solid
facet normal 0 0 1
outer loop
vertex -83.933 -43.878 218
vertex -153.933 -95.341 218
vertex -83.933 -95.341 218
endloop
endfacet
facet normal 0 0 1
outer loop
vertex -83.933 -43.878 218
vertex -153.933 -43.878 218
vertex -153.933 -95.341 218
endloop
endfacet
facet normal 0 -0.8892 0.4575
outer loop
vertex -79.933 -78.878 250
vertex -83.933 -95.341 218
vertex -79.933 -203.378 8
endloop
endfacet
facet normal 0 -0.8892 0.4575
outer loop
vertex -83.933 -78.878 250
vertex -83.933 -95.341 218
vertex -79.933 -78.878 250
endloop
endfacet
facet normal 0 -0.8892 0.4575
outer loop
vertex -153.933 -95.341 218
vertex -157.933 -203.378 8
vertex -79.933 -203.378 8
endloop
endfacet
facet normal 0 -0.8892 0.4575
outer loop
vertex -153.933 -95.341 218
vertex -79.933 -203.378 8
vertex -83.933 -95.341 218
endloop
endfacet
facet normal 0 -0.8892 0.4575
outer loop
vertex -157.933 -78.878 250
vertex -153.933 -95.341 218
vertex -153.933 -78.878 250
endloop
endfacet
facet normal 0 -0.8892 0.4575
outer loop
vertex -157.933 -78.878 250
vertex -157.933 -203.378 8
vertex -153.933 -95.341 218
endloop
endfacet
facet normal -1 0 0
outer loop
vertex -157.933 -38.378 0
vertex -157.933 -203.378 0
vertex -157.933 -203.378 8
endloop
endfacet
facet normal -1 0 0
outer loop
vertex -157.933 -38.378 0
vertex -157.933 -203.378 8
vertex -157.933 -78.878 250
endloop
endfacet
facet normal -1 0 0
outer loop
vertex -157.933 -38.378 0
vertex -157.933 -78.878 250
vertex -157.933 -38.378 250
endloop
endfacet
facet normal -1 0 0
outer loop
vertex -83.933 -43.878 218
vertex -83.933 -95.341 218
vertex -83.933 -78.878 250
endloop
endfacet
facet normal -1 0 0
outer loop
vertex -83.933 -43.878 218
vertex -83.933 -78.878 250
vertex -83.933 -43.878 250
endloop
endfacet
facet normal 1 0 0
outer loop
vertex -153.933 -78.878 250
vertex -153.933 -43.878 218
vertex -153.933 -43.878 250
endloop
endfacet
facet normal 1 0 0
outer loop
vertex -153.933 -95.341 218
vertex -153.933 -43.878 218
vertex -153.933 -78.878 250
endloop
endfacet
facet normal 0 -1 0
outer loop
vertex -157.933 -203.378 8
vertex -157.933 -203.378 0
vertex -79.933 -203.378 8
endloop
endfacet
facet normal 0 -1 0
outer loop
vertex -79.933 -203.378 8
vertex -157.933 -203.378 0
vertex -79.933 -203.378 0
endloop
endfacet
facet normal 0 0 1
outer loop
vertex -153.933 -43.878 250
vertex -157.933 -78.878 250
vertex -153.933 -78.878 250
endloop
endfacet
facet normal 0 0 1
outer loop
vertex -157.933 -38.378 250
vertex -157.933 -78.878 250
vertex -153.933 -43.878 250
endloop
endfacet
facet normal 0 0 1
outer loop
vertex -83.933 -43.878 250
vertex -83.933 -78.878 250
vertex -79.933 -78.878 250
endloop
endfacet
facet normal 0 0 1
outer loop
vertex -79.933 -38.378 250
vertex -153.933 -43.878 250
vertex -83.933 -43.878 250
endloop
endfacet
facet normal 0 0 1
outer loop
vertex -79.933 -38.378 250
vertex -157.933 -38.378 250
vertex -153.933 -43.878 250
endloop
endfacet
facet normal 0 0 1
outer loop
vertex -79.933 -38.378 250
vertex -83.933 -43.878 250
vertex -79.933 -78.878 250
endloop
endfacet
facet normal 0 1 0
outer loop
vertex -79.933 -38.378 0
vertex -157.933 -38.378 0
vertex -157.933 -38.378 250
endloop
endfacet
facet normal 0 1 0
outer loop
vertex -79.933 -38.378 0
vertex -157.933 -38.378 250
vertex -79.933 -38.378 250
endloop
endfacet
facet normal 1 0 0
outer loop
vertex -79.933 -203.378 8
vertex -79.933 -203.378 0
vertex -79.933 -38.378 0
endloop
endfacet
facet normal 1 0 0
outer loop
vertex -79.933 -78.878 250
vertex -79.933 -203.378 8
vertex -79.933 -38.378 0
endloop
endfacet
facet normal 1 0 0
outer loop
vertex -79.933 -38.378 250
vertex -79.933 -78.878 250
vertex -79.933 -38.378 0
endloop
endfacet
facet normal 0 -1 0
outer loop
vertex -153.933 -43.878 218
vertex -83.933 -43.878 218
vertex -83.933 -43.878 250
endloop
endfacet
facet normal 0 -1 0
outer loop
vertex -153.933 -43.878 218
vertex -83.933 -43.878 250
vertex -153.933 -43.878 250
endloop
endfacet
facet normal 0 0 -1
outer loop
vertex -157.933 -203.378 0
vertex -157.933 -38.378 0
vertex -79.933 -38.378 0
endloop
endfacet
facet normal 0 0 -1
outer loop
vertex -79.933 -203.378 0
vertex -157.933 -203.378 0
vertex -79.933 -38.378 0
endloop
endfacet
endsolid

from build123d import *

# Parameters (mm, degrees)
ESQUISSE1_W                  = 78
ESQUISSE1_H                  = 165
BOSS_EXTRU_2_DEPTH           = 250
ENL_V_MAT_EXTRU_6_DEPTH      = 359.895122211
ENL_V_MAT_EXTRU_6_DEPTH_BACK = 32
ENL_V_MAT_EXTRU_7_DEPTH      = 332.582217321
ENL_V_MAT_EXTRU_7_DEPTH_BACK = 78


with BuildPart() as part:
    # Esquisse1 → Boss.-Extru.2 (new body)
    with BuildSketch(Plane.XY):
        with Locations((-118.933346394, -120.878383423)):
            Rectangle(ESQUISSE1_W, ESQUISSE1_H)
    extrude(amount=BOSS_EXTRU_2_DEPTH)

    # Esquisse3 → Enlèv. mat.-Extru.6 (cut, two sides: drawn at the far end of the back side and taken through both)
    with BuildSketch(Plane.XY.offset(250).offset(-ENL_V_MAT_EXTRU_6_DEPTH_BACK)):
        Polygon((-83.933346394, -575.046739794), (-83.933346394, -203.378383423), (-83.933346394, -43.878383423), (-153.933346394, -43.878383423), (-153.933346394, -203.378383423), (-153.933346394, -575.046739794), (-153.933346394, -1318.383452535), (-83.933346394, -1318.383452535), align=None)
    extrude(amount=ENL_V_MAT_EXTRU_6_DEPTH + ENL_V_MAT_EXTRU_6_DEPTH_BACK, mode=Mode.SUBTRACT)

    # Esquisse5 → Enlèv. mat.-Extru.7 (cut, two sides: drawn at the far end of the back side and taken through both)
    with BuildSketch(Plane(origin=(-79.933346394, 0, 0), x_dir=(0, 0, -1), z_dir=(1, 0, 0)).offset(-ENL_V_MAT_EXTRU_7_DEPTH_BACK)):
        Polygon((-779.795226733, 193.681557603), (-250, -78.878383423), (-8, -203.378383423), (521.795226733, -475.938324449), (-23.324655319, -1535.528777915), (-1324.915108785, -865.908895863), align=None)
    extrude(amount=ENL_V_MAT_EXTRU_7_DEPTH + ENL_V_MAT_EXTRU_7_DEPTH_BACK, mode=Mode.SUBTRACT)


solid = part.part
